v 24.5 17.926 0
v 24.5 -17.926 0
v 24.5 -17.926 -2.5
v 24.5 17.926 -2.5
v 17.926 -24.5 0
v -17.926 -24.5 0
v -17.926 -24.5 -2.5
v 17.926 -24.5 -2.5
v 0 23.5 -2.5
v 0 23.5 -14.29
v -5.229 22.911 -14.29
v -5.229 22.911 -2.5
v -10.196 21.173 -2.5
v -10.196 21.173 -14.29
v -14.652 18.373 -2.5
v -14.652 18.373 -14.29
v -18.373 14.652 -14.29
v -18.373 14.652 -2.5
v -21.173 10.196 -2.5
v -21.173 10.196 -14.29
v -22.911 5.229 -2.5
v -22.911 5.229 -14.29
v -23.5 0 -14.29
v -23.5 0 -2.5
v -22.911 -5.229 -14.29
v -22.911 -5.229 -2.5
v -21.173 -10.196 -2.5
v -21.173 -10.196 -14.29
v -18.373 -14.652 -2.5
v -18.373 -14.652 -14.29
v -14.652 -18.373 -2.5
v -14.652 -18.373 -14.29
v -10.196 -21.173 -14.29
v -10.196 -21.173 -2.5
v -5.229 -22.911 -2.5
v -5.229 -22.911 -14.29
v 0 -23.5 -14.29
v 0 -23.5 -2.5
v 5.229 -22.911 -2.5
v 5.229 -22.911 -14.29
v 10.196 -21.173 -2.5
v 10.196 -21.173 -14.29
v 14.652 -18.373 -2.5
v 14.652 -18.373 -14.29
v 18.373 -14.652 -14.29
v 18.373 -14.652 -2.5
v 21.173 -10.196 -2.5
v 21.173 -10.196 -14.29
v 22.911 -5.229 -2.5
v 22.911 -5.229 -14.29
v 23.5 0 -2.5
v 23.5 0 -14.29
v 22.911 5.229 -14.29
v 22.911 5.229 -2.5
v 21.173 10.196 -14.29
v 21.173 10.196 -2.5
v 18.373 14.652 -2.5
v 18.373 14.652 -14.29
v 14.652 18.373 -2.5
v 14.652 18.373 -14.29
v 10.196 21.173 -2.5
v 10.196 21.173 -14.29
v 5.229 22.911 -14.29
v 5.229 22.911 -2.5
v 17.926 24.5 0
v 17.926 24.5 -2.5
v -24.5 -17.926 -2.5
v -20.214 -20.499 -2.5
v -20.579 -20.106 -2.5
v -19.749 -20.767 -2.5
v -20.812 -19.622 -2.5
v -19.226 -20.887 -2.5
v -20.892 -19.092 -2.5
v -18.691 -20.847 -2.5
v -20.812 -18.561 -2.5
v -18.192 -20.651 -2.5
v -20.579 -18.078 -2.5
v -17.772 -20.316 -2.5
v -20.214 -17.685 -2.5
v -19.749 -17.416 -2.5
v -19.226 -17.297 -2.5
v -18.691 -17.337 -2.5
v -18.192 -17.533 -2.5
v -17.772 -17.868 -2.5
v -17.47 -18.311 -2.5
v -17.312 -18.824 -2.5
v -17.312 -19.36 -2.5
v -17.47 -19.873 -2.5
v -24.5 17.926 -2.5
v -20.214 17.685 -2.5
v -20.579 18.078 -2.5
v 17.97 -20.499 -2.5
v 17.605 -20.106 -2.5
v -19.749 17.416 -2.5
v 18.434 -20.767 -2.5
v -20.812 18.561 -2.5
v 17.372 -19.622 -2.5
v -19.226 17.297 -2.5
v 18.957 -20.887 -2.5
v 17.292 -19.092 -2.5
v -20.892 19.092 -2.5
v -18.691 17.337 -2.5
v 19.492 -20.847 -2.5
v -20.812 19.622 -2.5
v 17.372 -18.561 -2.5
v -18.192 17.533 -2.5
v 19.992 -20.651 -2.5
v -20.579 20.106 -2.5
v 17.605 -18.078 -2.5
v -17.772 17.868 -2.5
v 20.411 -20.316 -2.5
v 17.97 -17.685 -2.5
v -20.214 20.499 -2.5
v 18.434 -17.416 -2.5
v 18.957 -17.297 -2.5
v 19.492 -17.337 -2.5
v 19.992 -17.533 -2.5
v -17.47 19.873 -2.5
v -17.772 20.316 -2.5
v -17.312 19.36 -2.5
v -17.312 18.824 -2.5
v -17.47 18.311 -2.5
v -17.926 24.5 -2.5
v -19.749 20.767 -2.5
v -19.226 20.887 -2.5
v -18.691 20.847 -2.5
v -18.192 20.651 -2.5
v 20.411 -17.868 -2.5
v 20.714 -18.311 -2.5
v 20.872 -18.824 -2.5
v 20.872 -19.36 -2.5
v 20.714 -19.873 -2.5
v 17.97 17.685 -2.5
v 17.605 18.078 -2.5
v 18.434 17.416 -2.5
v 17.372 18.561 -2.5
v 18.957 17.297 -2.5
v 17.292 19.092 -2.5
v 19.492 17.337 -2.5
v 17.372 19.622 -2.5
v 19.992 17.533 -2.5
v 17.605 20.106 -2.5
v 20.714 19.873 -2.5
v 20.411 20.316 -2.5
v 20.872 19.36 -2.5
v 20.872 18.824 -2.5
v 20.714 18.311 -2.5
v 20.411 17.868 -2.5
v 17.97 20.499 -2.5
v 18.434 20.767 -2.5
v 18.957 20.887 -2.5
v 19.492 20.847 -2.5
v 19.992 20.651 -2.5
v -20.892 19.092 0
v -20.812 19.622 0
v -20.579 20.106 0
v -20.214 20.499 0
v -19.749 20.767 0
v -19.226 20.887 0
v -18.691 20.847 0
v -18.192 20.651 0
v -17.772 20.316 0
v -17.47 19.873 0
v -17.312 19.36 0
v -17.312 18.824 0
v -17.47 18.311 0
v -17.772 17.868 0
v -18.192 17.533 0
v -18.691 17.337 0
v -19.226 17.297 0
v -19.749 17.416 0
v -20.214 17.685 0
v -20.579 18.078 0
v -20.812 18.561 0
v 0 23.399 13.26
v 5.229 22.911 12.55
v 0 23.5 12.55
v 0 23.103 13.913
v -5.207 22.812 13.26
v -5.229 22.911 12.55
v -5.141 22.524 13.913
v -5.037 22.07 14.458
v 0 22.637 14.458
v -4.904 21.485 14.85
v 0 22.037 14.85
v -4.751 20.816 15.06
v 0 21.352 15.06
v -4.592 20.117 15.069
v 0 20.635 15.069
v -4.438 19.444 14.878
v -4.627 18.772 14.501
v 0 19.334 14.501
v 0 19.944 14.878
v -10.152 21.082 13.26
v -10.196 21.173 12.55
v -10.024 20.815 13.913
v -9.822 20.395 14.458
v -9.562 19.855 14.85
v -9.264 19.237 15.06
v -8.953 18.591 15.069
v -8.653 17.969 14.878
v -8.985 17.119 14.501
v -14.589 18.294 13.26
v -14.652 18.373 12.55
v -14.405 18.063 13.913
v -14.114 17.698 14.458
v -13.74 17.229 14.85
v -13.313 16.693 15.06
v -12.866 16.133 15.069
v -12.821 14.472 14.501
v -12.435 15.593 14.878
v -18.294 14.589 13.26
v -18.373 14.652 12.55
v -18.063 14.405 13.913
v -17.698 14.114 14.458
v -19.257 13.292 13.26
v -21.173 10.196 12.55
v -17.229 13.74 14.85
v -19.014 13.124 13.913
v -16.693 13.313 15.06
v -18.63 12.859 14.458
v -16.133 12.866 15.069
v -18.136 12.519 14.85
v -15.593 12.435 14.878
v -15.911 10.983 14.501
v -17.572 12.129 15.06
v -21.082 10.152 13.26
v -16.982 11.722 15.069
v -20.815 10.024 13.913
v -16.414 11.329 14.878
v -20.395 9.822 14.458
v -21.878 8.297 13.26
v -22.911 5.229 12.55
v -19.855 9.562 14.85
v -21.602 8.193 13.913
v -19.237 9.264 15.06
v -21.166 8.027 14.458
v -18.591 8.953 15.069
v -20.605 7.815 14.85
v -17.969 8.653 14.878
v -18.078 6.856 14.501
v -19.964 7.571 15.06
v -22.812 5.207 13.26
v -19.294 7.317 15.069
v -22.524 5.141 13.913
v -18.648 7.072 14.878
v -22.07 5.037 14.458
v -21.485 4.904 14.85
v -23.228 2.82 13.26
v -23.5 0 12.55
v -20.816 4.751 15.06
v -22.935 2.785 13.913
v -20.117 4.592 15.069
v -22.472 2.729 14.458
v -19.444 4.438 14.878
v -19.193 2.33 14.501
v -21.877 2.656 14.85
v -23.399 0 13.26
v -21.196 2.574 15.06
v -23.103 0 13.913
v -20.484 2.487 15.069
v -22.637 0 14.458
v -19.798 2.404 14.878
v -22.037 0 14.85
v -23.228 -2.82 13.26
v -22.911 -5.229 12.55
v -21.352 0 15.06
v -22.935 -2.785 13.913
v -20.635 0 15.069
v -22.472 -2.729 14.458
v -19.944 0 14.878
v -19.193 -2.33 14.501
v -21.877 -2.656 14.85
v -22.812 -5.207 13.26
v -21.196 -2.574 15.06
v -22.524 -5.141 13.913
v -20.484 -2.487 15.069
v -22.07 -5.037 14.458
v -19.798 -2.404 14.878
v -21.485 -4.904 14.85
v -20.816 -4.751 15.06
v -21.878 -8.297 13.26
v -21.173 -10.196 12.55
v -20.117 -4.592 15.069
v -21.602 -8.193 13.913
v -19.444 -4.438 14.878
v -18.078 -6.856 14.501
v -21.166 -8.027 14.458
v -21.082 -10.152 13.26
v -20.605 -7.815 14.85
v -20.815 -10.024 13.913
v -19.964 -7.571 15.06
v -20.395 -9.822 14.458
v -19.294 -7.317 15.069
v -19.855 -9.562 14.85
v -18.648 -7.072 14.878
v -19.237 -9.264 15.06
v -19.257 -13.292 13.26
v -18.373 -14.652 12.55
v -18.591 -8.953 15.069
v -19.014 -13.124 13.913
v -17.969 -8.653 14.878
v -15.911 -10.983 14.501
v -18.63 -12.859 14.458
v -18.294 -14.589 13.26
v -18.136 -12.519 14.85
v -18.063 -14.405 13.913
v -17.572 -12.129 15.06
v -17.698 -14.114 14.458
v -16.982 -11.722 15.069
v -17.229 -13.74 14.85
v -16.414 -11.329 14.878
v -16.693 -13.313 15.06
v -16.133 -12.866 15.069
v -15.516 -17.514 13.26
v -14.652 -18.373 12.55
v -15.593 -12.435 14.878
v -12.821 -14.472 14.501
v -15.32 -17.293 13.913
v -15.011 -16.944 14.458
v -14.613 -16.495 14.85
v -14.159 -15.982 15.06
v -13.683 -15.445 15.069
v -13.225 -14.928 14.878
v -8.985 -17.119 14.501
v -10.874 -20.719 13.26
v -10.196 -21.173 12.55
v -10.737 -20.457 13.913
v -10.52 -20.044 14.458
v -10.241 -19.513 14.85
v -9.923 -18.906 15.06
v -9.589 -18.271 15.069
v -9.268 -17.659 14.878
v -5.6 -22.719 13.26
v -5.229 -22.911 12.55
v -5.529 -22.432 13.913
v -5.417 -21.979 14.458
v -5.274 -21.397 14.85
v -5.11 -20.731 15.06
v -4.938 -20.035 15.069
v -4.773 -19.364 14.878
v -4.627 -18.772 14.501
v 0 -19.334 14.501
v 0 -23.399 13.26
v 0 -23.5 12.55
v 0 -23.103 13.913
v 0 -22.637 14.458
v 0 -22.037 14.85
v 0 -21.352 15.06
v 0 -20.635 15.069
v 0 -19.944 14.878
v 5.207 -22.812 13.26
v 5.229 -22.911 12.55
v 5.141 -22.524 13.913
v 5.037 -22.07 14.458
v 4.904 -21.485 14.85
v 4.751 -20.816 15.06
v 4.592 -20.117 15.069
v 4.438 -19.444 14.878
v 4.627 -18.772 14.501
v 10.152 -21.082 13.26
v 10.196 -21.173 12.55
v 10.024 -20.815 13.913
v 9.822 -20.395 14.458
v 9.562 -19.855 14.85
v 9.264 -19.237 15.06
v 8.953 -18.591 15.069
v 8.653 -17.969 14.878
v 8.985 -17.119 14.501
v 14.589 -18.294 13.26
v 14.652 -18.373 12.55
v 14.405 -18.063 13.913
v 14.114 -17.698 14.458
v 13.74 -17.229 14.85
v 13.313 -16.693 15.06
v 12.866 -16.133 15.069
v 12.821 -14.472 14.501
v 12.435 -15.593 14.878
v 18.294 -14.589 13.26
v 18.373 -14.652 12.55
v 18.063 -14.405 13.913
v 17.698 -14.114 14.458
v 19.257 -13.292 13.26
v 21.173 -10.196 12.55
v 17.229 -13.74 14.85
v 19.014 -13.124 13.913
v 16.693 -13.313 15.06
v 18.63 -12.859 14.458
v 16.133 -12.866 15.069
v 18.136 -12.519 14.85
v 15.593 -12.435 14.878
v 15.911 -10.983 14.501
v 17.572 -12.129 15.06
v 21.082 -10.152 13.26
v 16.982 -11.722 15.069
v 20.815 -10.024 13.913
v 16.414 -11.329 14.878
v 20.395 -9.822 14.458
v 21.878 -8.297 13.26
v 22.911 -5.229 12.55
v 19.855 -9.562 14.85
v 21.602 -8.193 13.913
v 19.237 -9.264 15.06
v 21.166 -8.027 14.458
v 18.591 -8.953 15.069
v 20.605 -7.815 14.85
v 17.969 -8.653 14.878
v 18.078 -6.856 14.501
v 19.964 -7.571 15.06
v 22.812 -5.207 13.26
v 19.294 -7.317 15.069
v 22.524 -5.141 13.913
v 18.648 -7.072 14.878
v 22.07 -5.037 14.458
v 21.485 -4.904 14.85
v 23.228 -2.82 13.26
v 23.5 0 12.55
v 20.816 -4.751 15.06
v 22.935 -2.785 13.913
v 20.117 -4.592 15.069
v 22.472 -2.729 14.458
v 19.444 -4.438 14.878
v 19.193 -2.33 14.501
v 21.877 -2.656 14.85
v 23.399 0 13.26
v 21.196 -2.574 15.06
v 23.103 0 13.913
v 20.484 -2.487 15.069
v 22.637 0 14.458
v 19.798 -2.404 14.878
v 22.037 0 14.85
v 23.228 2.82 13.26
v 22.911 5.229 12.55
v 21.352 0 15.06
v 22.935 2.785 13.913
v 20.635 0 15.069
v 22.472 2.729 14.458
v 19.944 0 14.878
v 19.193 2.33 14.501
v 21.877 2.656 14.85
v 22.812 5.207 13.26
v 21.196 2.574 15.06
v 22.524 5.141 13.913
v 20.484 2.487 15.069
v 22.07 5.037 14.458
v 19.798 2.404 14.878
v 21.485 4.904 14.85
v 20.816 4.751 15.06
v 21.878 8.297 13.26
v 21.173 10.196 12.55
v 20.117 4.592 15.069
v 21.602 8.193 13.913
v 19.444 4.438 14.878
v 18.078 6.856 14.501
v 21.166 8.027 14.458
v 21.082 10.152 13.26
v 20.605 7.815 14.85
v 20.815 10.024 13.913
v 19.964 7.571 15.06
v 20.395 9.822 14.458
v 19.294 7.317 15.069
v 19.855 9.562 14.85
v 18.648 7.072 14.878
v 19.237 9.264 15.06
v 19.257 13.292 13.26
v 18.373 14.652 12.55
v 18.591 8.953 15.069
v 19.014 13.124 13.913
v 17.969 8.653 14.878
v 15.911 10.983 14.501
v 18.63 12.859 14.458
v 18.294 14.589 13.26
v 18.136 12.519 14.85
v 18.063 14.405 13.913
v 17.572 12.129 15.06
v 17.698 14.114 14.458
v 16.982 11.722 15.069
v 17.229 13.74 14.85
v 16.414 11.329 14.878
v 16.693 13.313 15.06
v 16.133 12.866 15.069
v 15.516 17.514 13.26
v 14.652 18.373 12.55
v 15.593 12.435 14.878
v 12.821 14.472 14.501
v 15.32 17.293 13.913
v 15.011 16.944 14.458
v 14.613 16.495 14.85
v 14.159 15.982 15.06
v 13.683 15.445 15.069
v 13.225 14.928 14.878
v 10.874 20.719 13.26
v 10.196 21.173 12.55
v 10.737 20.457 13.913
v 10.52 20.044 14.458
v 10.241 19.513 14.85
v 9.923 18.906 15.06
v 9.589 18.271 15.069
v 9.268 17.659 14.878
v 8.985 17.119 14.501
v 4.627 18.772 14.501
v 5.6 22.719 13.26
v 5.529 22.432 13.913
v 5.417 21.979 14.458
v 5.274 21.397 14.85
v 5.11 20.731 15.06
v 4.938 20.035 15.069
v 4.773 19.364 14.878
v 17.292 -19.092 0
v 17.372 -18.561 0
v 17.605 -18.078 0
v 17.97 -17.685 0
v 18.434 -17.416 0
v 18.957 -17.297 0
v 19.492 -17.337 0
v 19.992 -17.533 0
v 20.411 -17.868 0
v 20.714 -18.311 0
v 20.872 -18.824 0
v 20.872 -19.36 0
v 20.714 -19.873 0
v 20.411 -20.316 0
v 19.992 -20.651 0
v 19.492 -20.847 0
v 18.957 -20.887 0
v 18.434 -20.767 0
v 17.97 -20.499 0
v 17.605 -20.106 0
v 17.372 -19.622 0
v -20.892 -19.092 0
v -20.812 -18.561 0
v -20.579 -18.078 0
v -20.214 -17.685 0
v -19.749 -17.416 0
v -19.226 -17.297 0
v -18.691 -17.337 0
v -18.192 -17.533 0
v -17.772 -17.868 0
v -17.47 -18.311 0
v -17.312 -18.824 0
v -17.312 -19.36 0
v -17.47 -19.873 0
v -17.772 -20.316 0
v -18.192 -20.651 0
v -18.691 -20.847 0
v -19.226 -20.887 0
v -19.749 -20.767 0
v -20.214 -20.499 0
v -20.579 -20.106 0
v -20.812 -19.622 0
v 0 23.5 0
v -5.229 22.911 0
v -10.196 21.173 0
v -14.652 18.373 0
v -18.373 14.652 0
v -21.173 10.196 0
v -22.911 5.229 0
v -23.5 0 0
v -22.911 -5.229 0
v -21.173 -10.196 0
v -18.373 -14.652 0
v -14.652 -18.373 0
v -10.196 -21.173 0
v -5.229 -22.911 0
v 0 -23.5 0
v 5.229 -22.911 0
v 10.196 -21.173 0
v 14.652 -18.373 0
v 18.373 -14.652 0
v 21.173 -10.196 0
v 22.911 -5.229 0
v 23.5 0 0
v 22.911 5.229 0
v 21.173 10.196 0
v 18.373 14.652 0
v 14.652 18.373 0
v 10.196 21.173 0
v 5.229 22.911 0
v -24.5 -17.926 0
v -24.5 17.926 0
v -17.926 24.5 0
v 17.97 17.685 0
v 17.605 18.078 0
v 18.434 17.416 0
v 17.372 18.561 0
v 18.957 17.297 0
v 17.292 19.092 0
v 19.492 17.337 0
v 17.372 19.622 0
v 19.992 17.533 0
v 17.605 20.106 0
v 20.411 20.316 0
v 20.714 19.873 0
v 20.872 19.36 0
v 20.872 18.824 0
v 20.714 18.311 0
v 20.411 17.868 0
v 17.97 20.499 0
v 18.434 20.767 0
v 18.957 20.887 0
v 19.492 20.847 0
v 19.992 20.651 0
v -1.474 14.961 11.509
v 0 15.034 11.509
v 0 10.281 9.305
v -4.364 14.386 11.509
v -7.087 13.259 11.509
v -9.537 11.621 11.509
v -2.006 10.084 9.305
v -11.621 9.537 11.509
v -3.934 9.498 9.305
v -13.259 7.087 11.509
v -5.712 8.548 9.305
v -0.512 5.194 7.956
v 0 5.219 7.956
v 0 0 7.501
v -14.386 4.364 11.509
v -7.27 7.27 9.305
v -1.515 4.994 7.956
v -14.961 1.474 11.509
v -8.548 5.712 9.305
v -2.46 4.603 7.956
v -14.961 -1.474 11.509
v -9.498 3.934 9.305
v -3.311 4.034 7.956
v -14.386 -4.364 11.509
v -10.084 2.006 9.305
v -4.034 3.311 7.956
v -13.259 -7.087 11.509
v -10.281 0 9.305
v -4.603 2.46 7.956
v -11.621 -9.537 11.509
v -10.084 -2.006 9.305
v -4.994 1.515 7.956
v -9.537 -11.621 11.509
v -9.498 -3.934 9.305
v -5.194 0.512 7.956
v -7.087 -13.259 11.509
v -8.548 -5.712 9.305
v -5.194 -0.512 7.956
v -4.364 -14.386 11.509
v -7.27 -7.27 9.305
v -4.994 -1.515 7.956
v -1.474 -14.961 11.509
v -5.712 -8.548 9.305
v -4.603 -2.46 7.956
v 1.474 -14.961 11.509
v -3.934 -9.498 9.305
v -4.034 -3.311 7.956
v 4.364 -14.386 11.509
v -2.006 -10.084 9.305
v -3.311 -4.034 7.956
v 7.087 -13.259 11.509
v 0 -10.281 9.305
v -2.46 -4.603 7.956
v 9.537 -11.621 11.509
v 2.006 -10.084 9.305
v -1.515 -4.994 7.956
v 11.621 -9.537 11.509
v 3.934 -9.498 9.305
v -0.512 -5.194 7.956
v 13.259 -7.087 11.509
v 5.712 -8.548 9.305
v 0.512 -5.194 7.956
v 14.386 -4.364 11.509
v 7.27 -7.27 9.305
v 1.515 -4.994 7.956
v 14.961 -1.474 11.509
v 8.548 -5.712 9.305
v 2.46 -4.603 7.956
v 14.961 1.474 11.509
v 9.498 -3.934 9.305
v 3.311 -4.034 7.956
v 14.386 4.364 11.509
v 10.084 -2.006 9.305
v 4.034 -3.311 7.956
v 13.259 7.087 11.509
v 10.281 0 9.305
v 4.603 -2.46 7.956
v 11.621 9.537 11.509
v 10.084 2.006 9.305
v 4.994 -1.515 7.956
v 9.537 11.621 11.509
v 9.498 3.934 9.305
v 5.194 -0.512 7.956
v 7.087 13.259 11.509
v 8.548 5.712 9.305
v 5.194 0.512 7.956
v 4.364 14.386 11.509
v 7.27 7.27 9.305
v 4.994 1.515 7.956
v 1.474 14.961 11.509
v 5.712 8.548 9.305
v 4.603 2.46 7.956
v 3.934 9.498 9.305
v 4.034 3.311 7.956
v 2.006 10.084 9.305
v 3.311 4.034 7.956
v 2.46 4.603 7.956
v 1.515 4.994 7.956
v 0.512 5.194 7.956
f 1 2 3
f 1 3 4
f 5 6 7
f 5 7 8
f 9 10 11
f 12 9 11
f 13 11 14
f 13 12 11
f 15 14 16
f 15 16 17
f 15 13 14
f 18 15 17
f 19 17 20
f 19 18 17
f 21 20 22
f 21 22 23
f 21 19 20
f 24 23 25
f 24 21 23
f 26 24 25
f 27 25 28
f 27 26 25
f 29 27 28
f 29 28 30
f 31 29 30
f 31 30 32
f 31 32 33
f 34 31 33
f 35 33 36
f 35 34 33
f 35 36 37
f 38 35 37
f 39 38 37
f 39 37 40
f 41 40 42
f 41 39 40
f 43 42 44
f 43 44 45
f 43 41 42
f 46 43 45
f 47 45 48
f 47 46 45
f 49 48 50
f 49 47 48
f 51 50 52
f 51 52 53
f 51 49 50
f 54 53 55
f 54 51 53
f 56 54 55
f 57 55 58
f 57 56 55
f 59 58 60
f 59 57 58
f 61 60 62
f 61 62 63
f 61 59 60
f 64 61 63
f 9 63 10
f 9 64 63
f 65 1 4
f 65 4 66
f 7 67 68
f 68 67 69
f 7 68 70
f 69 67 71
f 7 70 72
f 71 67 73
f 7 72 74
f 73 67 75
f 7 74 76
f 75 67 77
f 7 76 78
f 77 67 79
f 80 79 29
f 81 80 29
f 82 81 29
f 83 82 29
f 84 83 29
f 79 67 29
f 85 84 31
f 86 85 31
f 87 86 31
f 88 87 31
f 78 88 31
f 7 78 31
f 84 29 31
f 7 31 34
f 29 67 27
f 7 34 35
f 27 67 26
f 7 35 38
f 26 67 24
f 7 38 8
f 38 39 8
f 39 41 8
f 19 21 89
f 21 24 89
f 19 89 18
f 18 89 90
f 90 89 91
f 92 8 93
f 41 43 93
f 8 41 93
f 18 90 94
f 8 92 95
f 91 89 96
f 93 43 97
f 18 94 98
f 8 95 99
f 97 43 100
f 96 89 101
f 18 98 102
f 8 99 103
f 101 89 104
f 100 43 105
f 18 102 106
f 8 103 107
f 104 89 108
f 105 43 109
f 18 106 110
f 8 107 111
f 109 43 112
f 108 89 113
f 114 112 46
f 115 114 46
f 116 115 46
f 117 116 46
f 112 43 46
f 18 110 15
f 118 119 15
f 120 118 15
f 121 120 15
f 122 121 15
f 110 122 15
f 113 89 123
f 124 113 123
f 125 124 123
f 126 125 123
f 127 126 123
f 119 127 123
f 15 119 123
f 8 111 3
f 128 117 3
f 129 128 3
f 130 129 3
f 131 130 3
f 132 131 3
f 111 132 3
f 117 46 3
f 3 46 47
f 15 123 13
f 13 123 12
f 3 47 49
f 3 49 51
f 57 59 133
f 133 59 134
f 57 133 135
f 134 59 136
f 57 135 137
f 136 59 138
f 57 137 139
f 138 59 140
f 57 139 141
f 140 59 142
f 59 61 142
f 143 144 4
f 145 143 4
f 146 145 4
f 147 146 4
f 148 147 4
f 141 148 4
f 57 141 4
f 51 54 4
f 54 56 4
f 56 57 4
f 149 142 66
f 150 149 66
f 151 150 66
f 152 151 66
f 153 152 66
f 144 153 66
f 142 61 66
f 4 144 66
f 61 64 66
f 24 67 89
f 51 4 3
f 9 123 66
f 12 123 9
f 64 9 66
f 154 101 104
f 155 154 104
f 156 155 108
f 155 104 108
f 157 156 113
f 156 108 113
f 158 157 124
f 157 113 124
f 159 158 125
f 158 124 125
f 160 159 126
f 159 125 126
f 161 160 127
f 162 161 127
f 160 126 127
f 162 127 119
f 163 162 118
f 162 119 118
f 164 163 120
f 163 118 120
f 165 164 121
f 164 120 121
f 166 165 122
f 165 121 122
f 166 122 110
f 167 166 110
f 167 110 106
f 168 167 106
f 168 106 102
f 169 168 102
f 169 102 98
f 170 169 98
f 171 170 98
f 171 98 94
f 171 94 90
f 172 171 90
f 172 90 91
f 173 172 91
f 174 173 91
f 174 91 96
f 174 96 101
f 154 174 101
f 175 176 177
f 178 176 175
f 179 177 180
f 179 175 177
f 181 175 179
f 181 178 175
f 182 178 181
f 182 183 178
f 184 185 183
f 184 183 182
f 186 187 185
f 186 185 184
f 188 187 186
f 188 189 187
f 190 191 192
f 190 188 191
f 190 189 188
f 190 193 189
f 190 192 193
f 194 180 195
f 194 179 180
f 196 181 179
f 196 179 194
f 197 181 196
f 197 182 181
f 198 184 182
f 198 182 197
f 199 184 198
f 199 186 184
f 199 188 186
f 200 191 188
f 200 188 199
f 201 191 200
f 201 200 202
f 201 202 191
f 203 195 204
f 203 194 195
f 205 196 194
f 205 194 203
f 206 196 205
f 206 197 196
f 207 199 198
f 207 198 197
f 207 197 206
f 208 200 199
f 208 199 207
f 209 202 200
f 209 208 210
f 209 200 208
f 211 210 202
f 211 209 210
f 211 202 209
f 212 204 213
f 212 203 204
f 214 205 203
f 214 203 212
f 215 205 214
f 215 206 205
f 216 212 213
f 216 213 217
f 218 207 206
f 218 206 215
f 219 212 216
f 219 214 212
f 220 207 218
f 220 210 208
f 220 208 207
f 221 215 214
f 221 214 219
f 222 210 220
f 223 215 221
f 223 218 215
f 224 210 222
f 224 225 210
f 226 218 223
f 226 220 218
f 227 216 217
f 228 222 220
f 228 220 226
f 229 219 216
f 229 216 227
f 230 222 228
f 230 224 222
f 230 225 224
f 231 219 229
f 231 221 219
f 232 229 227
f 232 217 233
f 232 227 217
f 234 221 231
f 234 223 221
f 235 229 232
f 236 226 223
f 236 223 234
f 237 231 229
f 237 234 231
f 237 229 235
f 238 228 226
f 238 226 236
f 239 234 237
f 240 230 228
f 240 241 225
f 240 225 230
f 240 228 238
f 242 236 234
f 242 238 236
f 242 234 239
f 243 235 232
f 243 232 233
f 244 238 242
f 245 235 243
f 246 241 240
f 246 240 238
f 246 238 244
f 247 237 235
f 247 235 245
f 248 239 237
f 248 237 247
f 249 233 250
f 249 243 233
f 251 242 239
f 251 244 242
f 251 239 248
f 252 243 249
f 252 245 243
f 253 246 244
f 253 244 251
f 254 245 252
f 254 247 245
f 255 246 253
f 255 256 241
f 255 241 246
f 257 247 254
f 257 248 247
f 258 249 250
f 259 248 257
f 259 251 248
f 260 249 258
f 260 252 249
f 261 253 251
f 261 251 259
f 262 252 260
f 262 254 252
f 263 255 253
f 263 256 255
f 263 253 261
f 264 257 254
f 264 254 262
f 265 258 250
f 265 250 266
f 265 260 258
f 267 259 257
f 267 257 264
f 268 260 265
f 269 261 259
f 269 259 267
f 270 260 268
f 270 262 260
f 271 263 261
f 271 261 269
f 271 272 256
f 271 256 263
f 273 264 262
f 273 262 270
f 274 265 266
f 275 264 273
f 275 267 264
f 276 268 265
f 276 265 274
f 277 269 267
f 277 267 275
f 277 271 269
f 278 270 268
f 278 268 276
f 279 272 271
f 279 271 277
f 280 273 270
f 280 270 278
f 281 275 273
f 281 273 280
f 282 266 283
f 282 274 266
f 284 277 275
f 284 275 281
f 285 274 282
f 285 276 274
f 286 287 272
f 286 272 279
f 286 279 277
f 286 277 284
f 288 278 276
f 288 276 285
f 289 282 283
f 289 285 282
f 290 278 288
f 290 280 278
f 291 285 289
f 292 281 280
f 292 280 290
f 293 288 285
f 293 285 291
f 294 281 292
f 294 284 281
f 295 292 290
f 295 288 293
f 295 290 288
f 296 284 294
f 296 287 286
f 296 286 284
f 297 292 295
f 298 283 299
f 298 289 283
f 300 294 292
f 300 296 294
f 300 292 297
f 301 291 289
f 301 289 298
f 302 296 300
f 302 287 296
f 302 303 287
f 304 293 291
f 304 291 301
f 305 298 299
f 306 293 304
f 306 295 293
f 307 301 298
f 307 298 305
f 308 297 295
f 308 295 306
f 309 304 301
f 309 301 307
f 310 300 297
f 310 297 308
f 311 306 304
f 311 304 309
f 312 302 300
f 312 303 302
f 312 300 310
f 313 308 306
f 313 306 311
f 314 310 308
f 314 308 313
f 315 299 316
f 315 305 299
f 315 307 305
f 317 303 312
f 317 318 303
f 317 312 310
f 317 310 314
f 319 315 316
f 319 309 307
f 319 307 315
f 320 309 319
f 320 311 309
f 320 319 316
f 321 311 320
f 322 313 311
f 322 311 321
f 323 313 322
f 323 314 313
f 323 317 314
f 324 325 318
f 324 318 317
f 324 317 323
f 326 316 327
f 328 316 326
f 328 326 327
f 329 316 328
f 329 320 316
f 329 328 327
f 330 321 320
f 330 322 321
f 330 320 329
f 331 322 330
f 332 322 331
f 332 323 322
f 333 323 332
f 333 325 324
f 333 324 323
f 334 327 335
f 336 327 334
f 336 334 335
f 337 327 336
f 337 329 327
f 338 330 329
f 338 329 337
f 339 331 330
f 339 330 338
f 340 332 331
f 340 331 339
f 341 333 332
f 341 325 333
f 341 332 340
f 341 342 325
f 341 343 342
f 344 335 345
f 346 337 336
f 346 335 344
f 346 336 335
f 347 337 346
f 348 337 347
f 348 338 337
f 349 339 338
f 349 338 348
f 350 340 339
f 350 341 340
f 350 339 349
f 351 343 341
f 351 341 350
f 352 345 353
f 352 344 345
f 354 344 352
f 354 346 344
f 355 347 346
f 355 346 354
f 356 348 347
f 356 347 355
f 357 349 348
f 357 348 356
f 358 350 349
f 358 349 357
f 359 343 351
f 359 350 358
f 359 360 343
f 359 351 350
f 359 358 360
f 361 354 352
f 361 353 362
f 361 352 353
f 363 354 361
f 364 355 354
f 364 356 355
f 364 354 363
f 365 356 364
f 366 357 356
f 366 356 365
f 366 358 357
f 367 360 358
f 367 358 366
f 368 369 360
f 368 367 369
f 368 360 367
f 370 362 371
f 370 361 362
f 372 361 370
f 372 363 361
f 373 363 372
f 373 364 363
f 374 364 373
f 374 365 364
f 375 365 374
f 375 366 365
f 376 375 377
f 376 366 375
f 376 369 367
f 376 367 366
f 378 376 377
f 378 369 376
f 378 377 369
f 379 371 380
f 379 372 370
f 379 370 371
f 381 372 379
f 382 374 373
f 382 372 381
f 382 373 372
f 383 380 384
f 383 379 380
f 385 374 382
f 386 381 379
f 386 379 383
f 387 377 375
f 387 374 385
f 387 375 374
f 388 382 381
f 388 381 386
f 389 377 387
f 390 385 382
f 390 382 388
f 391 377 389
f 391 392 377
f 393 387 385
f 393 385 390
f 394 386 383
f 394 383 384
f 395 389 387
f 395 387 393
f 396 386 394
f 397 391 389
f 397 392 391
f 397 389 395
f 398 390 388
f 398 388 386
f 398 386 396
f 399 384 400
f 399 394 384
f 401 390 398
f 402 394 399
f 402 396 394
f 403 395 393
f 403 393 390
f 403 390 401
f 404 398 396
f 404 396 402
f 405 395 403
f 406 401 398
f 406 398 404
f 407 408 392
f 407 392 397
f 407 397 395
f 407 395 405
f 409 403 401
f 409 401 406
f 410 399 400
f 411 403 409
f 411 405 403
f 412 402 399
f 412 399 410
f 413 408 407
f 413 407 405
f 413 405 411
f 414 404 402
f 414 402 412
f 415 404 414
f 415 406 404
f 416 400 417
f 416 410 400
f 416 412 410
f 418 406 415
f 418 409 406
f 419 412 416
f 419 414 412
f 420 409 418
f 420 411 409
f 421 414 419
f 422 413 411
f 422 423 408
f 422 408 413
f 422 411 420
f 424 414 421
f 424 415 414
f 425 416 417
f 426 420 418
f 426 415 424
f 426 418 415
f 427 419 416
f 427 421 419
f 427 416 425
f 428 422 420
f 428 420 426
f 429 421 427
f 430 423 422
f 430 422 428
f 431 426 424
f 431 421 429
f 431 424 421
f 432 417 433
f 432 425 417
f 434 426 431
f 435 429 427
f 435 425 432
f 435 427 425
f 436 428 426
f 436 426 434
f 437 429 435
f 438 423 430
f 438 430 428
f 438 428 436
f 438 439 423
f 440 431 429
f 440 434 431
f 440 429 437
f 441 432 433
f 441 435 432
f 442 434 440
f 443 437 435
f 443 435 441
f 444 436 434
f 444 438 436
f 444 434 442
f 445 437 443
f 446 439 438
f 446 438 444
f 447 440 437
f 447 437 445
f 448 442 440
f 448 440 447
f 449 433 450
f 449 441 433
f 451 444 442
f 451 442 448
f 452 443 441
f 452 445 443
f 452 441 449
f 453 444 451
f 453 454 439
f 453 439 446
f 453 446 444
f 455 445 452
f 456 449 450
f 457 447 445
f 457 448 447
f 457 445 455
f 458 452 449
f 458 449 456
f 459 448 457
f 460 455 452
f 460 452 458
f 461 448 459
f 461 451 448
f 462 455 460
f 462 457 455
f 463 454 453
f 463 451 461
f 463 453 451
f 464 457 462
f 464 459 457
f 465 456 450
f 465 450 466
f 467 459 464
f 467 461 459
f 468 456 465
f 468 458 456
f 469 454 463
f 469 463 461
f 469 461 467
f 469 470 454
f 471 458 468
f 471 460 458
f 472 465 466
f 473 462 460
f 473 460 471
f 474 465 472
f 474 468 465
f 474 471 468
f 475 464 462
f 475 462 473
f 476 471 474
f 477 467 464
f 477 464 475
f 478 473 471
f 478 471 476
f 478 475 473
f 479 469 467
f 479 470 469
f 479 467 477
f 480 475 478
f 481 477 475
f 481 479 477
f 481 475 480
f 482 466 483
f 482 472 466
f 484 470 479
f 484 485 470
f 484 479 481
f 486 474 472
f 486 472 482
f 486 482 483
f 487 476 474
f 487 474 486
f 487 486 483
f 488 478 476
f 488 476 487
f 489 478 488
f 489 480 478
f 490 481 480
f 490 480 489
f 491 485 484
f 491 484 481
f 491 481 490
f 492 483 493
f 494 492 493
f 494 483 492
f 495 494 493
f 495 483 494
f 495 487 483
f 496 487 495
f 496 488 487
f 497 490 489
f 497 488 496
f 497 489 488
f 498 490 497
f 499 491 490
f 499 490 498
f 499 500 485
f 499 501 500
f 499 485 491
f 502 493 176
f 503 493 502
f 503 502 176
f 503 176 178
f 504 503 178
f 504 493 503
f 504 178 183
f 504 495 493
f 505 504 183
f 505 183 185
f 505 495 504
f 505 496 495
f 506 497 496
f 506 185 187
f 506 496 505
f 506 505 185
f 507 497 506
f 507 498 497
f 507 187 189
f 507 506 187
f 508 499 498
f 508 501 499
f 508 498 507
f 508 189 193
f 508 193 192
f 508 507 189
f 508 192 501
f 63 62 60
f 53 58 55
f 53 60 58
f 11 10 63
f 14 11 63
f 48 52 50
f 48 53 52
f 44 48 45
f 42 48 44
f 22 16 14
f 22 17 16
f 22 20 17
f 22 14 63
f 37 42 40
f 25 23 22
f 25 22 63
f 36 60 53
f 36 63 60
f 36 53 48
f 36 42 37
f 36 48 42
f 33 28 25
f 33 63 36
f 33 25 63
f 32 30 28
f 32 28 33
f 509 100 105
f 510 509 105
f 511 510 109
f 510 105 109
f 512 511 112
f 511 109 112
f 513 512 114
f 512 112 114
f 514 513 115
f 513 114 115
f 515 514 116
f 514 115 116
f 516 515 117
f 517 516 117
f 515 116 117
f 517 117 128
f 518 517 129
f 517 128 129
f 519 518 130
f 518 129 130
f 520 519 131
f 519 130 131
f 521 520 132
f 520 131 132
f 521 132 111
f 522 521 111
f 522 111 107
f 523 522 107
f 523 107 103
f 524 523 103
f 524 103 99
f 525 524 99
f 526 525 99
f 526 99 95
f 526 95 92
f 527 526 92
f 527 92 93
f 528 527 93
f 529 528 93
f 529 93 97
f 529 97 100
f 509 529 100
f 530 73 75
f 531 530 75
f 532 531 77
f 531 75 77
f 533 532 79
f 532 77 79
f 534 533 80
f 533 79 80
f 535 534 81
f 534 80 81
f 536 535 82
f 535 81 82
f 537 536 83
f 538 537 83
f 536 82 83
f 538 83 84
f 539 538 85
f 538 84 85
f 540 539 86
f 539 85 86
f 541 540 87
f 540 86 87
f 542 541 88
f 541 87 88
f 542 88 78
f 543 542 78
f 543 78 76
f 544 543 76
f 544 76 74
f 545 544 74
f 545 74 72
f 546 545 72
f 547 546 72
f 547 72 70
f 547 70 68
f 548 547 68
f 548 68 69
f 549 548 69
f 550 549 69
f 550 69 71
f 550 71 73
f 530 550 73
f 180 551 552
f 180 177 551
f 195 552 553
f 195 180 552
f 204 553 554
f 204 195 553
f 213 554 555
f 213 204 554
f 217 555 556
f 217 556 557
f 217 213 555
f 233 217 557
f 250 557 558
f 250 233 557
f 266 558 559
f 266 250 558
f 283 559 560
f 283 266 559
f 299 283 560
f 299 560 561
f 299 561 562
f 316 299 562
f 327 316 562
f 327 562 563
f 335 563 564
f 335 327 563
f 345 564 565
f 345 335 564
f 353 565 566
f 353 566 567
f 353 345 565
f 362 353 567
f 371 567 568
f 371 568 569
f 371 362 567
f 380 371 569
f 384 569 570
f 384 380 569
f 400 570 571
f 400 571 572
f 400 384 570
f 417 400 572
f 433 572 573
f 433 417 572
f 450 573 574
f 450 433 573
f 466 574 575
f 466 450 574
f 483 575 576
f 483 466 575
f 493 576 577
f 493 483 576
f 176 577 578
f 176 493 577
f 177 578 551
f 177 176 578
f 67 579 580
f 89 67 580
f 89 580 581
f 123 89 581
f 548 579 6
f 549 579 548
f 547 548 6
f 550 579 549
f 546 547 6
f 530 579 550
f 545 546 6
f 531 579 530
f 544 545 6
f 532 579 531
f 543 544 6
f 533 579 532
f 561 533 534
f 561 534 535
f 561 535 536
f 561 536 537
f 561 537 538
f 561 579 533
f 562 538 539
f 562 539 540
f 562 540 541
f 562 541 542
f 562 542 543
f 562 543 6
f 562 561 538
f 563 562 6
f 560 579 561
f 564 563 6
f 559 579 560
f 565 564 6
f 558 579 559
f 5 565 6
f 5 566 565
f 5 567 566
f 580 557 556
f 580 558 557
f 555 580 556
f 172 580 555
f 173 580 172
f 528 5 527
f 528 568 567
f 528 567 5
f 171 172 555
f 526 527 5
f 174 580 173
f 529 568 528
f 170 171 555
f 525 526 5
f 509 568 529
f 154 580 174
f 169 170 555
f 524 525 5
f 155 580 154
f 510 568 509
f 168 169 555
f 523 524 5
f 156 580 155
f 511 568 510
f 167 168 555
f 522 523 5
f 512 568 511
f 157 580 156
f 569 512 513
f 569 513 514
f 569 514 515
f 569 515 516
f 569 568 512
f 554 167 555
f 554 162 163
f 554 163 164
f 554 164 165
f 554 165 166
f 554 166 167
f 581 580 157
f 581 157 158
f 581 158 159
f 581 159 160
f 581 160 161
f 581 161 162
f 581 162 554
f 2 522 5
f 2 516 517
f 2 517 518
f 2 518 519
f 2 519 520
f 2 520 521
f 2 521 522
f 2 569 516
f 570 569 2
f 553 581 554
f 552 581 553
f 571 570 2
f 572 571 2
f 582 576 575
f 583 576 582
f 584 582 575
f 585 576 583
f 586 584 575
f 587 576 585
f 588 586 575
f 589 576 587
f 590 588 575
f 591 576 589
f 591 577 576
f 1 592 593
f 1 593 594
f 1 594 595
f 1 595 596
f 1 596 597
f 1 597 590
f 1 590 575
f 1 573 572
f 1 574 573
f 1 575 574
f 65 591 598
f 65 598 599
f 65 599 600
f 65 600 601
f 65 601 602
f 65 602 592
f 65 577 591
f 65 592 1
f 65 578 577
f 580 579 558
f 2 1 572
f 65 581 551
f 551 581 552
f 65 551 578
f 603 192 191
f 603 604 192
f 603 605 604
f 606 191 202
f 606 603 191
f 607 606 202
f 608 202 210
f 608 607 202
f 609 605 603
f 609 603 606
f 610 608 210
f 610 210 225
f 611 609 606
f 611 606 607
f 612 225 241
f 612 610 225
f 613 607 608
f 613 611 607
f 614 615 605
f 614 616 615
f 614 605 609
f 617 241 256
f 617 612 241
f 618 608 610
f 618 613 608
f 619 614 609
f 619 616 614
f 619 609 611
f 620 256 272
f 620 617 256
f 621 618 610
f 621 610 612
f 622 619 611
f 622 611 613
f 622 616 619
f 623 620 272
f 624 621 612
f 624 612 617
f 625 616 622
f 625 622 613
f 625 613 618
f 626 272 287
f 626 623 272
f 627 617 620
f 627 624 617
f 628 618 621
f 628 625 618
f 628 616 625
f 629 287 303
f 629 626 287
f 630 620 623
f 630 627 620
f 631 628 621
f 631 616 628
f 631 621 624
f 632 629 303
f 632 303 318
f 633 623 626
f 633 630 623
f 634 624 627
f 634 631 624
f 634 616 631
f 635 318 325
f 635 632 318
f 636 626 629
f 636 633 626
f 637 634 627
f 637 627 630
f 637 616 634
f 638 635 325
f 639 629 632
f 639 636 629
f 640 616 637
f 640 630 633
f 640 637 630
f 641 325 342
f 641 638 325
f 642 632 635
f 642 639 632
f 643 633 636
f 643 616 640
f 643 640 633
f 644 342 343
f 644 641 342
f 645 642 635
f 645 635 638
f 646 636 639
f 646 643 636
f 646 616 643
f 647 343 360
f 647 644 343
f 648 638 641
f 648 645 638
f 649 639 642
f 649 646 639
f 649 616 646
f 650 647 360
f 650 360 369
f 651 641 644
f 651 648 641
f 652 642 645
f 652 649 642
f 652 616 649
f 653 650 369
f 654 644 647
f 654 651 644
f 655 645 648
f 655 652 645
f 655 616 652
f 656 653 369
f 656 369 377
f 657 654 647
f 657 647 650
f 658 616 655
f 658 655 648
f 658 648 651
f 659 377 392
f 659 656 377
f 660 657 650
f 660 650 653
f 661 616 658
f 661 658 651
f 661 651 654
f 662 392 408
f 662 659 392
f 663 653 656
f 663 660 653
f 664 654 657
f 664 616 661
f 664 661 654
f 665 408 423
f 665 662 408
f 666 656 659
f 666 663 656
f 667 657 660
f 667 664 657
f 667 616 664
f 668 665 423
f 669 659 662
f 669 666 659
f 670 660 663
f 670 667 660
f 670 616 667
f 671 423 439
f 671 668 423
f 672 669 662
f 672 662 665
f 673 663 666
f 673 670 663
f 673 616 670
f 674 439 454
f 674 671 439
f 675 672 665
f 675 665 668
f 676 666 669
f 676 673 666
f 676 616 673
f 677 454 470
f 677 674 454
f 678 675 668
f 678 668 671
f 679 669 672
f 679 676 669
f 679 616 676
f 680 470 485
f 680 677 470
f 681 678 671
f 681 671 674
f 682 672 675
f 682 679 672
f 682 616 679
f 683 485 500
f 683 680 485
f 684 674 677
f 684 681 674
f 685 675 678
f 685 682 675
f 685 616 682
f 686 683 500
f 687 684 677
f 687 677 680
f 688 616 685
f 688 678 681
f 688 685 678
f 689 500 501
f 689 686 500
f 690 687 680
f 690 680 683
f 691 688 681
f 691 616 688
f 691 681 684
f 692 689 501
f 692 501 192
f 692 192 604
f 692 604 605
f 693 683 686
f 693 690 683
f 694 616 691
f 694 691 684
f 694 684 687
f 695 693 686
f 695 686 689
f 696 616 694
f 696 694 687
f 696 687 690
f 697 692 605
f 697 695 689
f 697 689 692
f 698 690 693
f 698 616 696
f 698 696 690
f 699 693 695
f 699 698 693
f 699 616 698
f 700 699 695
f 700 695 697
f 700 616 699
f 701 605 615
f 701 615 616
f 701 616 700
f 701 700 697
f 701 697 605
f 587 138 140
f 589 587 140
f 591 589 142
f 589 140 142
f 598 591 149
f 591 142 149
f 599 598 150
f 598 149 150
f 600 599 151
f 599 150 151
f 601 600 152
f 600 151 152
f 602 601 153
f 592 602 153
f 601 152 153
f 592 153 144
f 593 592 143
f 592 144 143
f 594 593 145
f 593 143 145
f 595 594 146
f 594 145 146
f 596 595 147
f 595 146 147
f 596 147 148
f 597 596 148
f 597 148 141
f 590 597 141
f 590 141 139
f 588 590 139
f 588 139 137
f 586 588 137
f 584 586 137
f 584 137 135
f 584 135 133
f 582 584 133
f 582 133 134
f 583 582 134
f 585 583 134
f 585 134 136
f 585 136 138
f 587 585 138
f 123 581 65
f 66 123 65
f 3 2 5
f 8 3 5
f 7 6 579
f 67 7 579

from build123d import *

# Parameters (mm, degrees)
SKETCH1_W                  = 49
SKETCH1_H                  = 49
BOSS_EXTRUDE1_DEPTH        = 2.5
CUT_EXTRUDE1_DEPTH         = 2.5
F_3_6_3_6_DIAMETER_HOLE1_D = 3.6


with BuildPart() as part:
    # Sketch1 → Boss-Extrude1 (new body)
    with BuildSketch(Plane.XY):
        Rectangle(SKETCH1_W, SKETCH1_H)
    extrude(amount=-BOSS_EXTRUDE1_DEPTH)

    # Sketch2 → Revolve1 (revolve)
    with BuildSketch(Plane(origin=(0, 0, 0), x_dir=(0, 0, -1), z_dir=(1, 0, 0))):
        with BuildLine():
            Line((14.29, 0), (14.29, 23.5))
            Line((14.29, 23.5), (-12.55, 23.5))
            ThreePointArc((-12.55, 23.5), (-14.850205099, 22.037337692), (-14.501257994, 19.333902758))
            ThreePointArc((-14.501257994, 19.333902758), (-9.305131525, 10.281048048), (-7.501257994, 0))
            Line((-7.501257994, 0), (14.29, 0))
        make_face()
    revolve(axis=Axis((0, 0, 0), (0, 0, 1)))

    # Sketch3 → Cut-Extrude1 (cut)
    with BuildSketch(Plane.XY):
        Polygon((-24.5, 17.926406871), (-17.926406871, 24.5), (-24.5, 24.5), align=None)
        Polygon((24.5, 17.926406871), (17.926406871, 24.5), (24.5, 24.5), align=None)
        Polygon((-24.5, -17.926406871), (-24.5, -24.5), (-17.926406871, -24.5), align=None)
        Polygon((24.5, -17.926406871), (17.926406871, -24.5), (24.5, -24.5), align=None)
    extrude(amount=-CUT_EXTRUDE1_DEPTH, mode=Mode.SUBTRACT)

    # Ø3.6 (3.6) Diameter Hole1 (through all)
    with Locations(Plane.XY):
        with Locations((-19.091883092, 19.091883092), (19.091883092, -19.091883092), (-19.091883092, -19.091883092), (19.091883092, 19.091883092)):
            Hole(F_3_6_3_6_DIAMETER_HOLE1_D / 2)


solid = part.part
